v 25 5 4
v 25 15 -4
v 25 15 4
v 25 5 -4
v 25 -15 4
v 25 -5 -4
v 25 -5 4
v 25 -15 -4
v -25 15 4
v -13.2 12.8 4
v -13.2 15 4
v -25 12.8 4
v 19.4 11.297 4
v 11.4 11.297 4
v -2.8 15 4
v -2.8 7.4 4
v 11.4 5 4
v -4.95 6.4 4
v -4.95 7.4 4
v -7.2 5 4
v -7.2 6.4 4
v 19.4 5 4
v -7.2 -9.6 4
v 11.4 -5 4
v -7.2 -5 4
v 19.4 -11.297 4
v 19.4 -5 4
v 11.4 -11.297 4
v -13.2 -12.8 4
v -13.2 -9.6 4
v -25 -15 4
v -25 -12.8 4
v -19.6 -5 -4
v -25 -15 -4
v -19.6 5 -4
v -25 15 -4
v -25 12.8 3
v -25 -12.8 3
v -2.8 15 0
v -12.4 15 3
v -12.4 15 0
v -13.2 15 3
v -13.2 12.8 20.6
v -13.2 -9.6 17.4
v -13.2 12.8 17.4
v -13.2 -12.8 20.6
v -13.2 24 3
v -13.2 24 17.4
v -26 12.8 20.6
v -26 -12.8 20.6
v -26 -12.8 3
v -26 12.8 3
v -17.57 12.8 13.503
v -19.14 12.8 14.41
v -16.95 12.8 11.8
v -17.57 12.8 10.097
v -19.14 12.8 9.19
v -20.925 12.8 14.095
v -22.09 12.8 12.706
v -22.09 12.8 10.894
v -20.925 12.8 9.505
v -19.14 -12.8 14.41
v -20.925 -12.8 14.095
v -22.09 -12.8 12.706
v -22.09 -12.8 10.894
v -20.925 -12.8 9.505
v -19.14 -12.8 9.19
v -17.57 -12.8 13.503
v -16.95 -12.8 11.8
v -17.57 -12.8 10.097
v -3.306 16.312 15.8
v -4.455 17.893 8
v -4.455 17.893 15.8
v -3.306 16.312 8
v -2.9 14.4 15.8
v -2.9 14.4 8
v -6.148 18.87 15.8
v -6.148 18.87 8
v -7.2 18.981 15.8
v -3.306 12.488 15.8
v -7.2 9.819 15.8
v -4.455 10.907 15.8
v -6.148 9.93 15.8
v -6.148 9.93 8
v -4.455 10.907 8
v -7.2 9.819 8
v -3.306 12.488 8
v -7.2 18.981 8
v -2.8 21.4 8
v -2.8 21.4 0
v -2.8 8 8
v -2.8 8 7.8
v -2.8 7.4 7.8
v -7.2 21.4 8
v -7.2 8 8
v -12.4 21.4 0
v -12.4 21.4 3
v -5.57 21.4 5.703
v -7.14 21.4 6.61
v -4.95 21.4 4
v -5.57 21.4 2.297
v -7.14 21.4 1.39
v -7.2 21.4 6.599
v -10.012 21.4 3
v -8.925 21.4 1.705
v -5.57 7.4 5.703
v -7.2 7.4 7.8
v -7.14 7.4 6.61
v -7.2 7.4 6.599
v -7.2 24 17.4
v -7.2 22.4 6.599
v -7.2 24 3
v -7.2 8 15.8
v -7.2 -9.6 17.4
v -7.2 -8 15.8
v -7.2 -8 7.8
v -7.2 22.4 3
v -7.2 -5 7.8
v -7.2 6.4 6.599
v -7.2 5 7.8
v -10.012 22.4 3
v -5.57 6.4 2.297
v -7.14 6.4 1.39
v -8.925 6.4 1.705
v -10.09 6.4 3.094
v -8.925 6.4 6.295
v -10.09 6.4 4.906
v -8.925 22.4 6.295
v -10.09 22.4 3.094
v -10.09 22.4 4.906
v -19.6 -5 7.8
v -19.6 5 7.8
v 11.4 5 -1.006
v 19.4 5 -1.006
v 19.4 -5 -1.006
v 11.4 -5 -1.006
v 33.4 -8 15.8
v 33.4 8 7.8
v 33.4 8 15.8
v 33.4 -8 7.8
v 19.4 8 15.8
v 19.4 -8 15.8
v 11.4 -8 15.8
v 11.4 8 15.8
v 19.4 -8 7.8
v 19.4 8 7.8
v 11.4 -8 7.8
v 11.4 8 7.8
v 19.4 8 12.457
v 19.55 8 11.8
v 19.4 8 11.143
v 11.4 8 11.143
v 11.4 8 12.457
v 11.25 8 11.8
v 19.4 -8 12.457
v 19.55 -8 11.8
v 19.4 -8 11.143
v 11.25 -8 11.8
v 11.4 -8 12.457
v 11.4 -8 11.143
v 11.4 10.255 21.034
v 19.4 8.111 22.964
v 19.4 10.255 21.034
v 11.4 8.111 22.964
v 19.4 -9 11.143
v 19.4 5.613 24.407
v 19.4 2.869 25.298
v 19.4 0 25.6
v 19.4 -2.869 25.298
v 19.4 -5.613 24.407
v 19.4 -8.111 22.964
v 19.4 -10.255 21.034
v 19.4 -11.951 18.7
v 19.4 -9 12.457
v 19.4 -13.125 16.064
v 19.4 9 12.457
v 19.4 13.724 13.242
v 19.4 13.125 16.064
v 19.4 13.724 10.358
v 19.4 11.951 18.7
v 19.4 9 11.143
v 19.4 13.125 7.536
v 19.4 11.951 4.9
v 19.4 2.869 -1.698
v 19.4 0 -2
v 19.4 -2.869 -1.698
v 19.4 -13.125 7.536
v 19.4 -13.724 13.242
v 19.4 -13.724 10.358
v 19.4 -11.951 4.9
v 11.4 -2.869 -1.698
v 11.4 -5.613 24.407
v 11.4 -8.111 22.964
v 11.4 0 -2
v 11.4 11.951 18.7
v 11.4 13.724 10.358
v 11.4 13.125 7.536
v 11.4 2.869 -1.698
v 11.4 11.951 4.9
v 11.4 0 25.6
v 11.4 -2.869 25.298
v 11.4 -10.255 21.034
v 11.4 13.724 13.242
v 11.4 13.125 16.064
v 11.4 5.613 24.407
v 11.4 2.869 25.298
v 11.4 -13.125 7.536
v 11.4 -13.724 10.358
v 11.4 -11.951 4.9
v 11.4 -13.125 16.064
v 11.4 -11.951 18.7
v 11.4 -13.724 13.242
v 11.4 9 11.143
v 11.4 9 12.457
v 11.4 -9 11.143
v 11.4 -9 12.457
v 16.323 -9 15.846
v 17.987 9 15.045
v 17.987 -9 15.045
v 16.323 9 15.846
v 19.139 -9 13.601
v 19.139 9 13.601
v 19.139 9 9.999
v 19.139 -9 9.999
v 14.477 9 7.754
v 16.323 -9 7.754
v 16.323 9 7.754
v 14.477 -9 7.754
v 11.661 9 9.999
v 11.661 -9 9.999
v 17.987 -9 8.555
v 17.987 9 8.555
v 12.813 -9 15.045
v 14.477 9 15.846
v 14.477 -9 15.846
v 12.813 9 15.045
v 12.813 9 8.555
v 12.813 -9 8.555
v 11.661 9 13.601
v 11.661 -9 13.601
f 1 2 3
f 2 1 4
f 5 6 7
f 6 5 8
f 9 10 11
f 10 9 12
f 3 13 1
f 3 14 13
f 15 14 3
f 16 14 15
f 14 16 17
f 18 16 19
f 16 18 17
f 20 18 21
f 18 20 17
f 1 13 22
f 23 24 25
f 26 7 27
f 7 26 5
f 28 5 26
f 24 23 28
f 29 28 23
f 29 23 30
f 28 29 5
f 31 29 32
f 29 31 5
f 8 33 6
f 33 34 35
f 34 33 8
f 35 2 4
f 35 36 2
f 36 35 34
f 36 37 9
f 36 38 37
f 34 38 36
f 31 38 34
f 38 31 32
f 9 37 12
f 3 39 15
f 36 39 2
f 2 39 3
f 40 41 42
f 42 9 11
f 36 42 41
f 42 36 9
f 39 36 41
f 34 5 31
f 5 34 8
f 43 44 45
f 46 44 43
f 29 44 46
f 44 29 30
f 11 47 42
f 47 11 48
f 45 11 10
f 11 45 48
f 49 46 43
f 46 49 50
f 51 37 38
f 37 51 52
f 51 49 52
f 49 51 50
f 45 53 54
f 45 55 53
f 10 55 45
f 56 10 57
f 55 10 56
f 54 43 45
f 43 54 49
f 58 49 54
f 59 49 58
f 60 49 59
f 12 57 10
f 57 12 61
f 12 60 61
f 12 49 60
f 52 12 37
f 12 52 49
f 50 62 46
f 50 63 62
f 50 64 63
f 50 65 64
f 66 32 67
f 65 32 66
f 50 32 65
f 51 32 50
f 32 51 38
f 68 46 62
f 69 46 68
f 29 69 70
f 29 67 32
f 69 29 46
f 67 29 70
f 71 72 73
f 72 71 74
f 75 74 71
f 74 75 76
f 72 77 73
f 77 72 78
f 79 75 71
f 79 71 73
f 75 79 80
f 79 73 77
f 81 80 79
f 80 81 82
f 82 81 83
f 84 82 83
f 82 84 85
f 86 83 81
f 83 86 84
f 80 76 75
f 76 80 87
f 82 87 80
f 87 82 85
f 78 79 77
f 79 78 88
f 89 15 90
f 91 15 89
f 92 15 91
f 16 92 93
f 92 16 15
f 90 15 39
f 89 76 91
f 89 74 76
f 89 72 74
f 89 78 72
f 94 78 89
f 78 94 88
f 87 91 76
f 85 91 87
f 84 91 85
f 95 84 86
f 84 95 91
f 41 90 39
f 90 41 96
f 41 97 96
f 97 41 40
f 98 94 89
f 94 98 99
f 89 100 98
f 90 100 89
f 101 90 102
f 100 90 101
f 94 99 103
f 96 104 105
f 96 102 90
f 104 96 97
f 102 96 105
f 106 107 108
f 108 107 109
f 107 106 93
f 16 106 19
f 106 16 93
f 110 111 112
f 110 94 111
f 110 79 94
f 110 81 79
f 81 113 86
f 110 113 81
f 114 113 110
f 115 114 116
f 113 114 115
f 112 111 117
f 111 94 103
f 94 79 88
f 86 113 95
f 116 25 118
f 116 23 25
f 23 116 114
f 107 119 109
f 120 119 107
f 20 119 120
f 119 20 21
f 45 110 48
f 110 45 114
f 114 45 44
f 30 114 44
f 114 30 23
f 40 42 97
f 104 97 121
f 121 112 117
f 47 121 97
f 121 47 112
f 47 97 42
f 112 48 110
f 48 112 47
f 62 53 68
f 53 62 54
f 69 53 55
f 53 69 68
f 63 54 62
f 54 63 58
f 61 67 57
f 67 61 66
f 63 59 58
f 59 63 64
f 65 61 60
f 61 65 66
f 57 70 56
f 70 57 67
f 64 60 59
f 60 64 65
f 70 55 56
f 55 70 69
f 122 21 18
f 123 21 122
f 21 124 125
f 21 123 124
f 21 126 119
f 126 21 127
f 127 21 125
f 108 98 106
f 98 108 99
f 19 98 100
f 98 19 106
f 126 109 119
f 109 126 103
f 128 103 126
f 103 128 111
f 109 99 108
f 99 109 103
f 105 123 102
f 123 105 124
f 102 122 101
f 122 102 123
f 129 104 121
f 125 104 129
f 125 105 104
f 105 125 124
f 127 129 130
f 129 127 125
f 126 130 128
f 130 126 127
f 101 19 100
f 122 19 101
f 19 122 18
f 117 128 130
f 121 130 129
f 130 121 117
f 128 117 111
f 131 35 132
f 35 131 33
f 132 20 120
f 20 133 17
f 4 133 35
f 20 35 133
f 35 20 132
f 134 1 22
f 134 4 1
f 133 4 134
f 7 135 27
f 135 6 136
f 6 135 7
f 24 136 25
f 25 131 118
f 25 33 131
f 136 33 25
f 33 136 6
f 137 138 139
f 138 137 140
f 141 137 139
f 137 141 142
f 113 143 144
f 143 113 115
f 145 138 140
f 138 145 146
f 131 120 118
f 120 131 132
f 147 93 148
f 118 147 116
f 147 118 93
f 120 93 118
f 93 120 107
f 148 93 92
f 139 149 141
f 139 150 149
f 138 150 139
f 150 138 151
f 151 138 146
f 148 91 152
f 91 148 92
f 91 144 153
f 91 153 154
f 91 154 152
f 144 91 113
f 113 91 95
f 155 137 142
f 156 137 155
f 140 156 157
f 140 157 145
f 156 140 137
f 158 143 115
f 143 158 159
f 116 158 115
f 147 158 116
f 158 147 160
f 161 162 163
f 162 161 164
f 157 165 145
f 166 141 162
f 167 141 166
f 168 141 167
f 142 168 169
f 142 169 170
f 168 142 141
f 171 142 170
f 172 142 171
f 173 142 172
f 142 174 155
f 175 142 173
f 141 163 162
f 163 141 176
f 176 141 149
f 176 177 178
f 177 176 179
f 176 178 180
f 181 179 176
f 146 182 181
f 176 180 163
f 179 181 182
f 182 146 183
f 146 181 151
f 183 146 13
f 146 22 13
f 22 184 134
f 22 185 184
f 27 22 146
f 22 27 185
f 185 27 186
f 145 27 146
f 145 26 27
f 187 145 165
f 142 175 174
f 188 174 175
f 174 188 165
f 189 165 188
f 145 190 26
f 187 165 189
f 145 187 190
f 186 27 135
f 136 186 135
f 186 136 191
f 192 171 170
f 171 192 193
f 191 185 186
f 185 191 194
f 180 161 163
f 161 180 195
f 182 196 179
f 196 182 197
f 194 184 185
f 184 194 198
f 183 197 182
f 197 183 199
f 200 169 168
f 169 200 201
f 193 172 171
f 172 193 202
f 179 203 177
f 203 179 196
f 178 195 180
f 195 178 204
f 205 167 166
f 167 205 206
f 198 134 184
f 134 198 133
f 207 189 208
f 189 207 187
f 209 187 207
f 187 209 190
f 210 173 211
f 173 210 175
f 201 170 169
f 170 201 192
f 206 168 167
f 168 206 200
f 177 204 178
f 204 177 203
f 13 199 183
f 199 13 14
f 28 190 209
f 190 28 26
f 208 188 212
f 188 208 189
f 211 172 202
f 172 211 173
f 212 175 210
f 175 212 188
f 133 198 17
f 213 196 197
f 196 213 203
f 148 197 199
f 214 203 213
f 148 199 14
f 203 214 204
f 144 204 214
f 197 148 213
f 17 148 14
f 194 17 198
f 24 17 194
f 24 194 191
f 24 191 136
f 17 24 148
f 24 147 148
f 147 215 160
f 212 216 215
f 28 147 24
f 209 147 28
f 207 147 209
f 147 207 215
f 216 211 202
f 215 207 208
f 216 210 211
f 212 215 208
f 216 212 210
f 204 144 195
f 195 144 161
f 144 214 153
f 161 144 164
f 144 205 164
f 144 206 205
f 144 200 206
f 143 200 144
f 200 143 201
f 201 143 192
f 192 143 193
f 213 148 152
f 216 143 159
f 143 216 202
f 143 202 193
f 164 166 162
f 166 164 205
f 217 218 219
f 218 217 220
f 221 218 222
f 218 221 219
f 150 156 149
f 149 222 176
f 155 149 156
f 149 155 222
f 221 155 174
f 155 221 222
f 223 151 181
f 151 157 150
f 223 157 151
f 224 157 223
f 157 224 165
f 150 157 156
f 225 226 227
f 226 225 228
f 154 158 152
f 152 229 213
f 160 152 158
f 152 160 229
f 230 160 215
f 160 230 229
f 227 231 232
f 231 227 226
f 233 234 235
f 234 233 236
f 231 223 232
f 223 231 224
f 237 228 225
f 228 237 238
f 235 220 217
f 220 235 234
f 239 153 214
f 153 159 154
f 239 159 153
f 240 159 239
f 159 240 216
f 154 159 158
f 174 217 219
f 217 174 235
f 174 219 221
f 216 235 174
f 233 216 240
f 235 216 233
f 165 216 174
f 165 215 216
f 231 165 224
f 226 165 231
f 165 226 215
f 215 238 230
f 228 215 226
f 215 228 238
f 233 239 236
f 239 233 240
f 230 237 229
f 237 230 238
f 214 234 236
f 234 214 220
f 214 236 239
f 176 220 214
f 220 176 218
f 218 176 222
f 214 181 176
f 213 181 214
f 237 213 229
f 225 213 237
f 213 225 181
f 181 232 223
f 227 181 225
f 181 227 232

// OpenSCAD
// Parameters
belt_width_mm = 6; //[3:12:1]
bearing_od_mm = 22; //[11:44:1]
bearing_id_mm = 8; //[4:16:1]
bearing_width_mm = 7; //[4:14:1]
idler_bolt_diameter_mm = 8; //[5:10:0.5]
pivot_bolt_diameter_mm = 5; //[3:8:0.5]
pivot_to_idler_center_distance_mm = 35; //[20:70:1]
arm_thickness_mm = 8; //[4:16:1]
arm_width_mm = 16; //[8:32:1]
base_thickness_mm = 8; //[4:16:1]
base_length_mm = 50; //[25:100:1]
base_width_mm = 30; //[15:60:1]
mount_hole_spacing_x_mm = 20; //[10:40:1]
mount_hole_diameter_mm = 5.2; //[3.5:7:0.1]
spring_free_length_mm = 20; //[10:40:1]
spring_outer_diameter_mm = 10; //[6:20:1]
spring_travel_mm = 6; //[2:12:1]
spring_preload_mm = 2; //[0:6:0.5]
spring_anchor_offset_mm = 12; //[6:24:1]
max_arm_rotation_deg = 25; //[10:45:1]
min_arm_rotation_deg = -5; //[-20:0:1]
belt_clearance_mm = 2; //[1:5:0.5]
bearing_side_clearance_mm = 0.5; //[0.2:1.5:0.1]
print_clearance_mm = 0.3; //[0.15:0.6:0.05]
overlap_mm = 1; //[0.5:2:0.1]
stop_block_thickness_mm = 6; //[3:12:1]

// Base bracket plate
module base_bracket_plate() {
  translate([0, 0, 0])
    cube([base_length_mm, base_width_mm, base_thickness_mm], center=true);
}

// Pivot axle mount block
module pivot_axle_mount_block() {
  translate([-base_length_mm/2 + (arm_thickness_mm*1.6)/2 - overlap_mm, 0, base_thickness_mm/2 + (base_thickness_mm + arm_thickness_mm*1.2)/2 - overlap_mm])
    cube([arm_thickness_mm*1.6, arm_width_mm*1.6, base_thickness_mm + arm_thickness_mm*1.2], center=true);
}

// Pivot hole cylinder
module pivot_hole_cyl() {
  translate([-base_length_mm/2 + (arm_thickness_mm*1.6)/2 - overlap_mm, 0, base_thickness_mm/2 + (base_thickness_mm + arm_thickness_mm*1.2)/2 - overlap_mm])
    rotate([90, 0, 0])
      cylinder(r=(pivot_bolt_diameter_mm + print_clearance_mm)/2, h=arm_width_mm*2.2, center=true);
}

// Mount hole cylinder
module mount_hole_cyl() {
  translate([0, 0, 0])
    cylinder(r=mount_hole_diameter_mm/2, h=base_thickness_mm + overlap_mm*2, center=true);
}

// Arm body box
module arm_body_box() {
  translate([-base_length_mm/2 + (arm_thickness_mm*1.6)/2 - overlap_mm + (pivot_to_idler_center_distance_mm + bearing_od_mm/2 + arm_thickness_mm)/2 - overlap_mm, 0, base_thickness_mm/2 + (base_thickness_mm + arm_thickness_mm*1.2)/2 - overlap_mm])
    cube([pivot_to_idler_center_distance_mm + bearing_od_mm/2 + arm_thickness_mm, arm_width_mm, arm_thickness_mm], center=true);
}

// Arm pivot hole cylinder
module arm_pivot_hole_cyl() {
  translate([-base_length_mm/2 + (arm_thickness_mm*1.6)/2 - overlap_mm, 0, base_thickness_mm/2 + (base_thickness_mm + arm_thickness_mm*1.2)/2 - overlap_mm])
    rotate([90, 0, 0])
      cylinder(r=(pivot_bolt_diameter_mm + print_clearance_mm)/2, h=arm_width_mm + overlap_mm*2, center=true);
}

// Idler boss cylinder
module idler_boss_cyl() {
  translate([-base_length_mm/2 + (arm_thickness_mm*1.6)/2 - overlap_mm + pivot_to_idler_center_distance_mm, 0, base_thickness_mm/2 + (base_thickness_mm + arm_thickness_mm*1.2)/2 - overlap_mm])
    rotate([0, 90, 0])
      cylinder(r=bearing_od_mm/2 + arm_thickness_mm*0.35, h=arm_thickness_mm, center=true);
}

// Idler bolt hole cylinder
module idler_bolt_hole_cyl() {
  translate([-base_length_mm/2 + (arm_thickness_mm*1.6)/2 - overlap_mm + pivot_to_idler_center_distance_mm, 0, base_thickness_mm/2 + (base_thickness_mm + arm_thickness_mm*1.2)/2 - overlap_mm])
    rotate([90, 0, 0])
      cylinder(r=(idler_bolt_diameter_mm + print_clearance_mm)/2, h=arm_width_mm + overlap_mm*2, center=true);
}

// Bearing spacer cylinder
module bearing_spacer_cyl() {
  translate([-base_length_mm/2 + (arm_thickness_mm*1.6)/2 - overlap_mm + pivot_to_idler_center_distance_mm, 0, base_thickness_mm/2 + (base_thickness_mm + arm_thickness_mm*1.2)/2 - overlap_mm])
    rotate([90, 0, 0])
      cylinder(r=bearing_id_mm/2 + print_clearance_mm, h=bearing_width_mm + bearing_side_clearance_mm*2, center=true);
}

// Spring post base cylinder
module spring_post_base_cyl() {
  translate([-base_length_mm/2 + (arm_thickness_mm*1.6)/2 - overlap_mm + spring_anchor_offset_mm, arm_width_mm*0.9, base_thickness_mm/2 + (base_thickness_mm + arm_thickness_mm*0.6)/2 - overlap_mm])
    cylinder(r=spring_outer_diameter_mm/2 - print_clearance_mm, h=base_thickness_mm + arm_thickness_mm*0.6, center=true);
}

// Spring post arm cylinder
module spring_post_arm_cyl() {
  translate([-base_length_mm/2 + (arm_thickness_mm*1.6)/2 - overlap_mm + spring_anchor_offset_mm, arm_width_mm*0.9, base_thickness_mm/2 + (base_thickness_mm + arm_thickness_mm*1.2)/2 - overlap_mm])
    cylinder(r=spring_outer_diameter_mm/2 - print_clearance_mm, h=arm_thickness_mm, center=true);
}

// Spring preload adjuster block
module spring_preload_adjuster_block() {
  translate([-base_length_mm/2 + (arm_thickness_mm*1.6)/2 - overlap_mm + spring_anchor_offset_mm, arm_width_mm*0.9, base_thickness_mm/2])
    cube([arm_thickness_mm*1.2, spring_outer_diameter_mm*1.4, base_thickness_mm], center=true);
}

// Spring adjuster hole cylinder
module spring_adjuster_hole_cyl() {
  translate([-base_length_mm/2 + (arm_thickness_mm*1.6)/2 - overlap_mm + spring_anchor_offset_mm, arm_width_mm*0.9, base_thickness_mm/2])
    rotate([90, 0, 0])
      cylinder(r=(pivot_bolt_diameter_mm + print_clearance_mm)/2, h=spring_outer_diameter_mm*1.6, center=true);
}

// Belt clearance channel box
module belt_clearance_channel_box() {
  translate([-base_length_mm/2 + (arm_thickness_mm*1.6)/2 - overlap_mm + (pivot_to_idler_center_distance_mm + bearing_od_mm)/2, 0, base_thickness_mm/2])
    cube([pivot_to_idler_center_distance_mm + bearing_od_mm, belt_width_mm + belt_clearance_mm*2, arm_thickness_mm + base_thickness_mm], center=true);
}

// Stop block max
module stop_block_max() {
  translate([-base_length_mm/2 + (arm_thickness_mm*1.6) - overlap_mm + stop_block_thickness_mm/2, 0, base_thickness_mm/2 + (base_thickness_mm + arm_thickness_mm*0.8)/2 - overlap_mm])
    cube([stop_block_thickness_mm, arm_width_mm*1.2, base_thickness_mm + arm_thickness_mm*0.8], center=true);
}

// Stop block min
module stop_block_min() {
  translate([-base_length_mm/2 + (arm_thickness_mm*1.6) - overlap_mm + stop_block_thickness_mm/2, arm_width_mm*0.9, base_thickness_mm/2 + (base_thickness_mm + arm_thickness_mm*0.8)/2 - overlap_mm])
    cube([stop_block_thickness_mm, arm_width_mm*1.2, base_thickness_mm + arm_thickness_mm*0.8], center=true);
}

// Base with holes
module base_with_holes() {
  difference() {
    union() {
      base_bracket_plate();
      pivot_axle_mount_block();
      spring_post_base_cyl();
      spring_preload_adjuster_block();
      stop_block_max();
      stop_block_min();
    }
    pivot_hole_cyl();
    translate([-mount_hole_spacing_x_mm/2, 0, 0]) mount_hole_cyl();
    translate([mount_hole_spacing_x_mm/2, 0, 0]) mount_hole_cyl();
    spring_adjuster_hole_cyl();
    belt_clearance_channel_box();
  }
}

// Pivot arm
module pivot_arm() {
  difference() {
    union() {
      arm_body_box();
      idler_boss_cyl();
      spring_post_arm_cyl();
      bearing_spacer_cyl();
    }
    arm_pivot_hole_cyl();
    idler_bolt_hole_cyl();
  }
}

// Tensioner assembly
module tensioner_assembly_union() {
  union() {
    base_with_holes();
    pivot_arm();
  }
}

// Final output
tensioner_assembly_union();
